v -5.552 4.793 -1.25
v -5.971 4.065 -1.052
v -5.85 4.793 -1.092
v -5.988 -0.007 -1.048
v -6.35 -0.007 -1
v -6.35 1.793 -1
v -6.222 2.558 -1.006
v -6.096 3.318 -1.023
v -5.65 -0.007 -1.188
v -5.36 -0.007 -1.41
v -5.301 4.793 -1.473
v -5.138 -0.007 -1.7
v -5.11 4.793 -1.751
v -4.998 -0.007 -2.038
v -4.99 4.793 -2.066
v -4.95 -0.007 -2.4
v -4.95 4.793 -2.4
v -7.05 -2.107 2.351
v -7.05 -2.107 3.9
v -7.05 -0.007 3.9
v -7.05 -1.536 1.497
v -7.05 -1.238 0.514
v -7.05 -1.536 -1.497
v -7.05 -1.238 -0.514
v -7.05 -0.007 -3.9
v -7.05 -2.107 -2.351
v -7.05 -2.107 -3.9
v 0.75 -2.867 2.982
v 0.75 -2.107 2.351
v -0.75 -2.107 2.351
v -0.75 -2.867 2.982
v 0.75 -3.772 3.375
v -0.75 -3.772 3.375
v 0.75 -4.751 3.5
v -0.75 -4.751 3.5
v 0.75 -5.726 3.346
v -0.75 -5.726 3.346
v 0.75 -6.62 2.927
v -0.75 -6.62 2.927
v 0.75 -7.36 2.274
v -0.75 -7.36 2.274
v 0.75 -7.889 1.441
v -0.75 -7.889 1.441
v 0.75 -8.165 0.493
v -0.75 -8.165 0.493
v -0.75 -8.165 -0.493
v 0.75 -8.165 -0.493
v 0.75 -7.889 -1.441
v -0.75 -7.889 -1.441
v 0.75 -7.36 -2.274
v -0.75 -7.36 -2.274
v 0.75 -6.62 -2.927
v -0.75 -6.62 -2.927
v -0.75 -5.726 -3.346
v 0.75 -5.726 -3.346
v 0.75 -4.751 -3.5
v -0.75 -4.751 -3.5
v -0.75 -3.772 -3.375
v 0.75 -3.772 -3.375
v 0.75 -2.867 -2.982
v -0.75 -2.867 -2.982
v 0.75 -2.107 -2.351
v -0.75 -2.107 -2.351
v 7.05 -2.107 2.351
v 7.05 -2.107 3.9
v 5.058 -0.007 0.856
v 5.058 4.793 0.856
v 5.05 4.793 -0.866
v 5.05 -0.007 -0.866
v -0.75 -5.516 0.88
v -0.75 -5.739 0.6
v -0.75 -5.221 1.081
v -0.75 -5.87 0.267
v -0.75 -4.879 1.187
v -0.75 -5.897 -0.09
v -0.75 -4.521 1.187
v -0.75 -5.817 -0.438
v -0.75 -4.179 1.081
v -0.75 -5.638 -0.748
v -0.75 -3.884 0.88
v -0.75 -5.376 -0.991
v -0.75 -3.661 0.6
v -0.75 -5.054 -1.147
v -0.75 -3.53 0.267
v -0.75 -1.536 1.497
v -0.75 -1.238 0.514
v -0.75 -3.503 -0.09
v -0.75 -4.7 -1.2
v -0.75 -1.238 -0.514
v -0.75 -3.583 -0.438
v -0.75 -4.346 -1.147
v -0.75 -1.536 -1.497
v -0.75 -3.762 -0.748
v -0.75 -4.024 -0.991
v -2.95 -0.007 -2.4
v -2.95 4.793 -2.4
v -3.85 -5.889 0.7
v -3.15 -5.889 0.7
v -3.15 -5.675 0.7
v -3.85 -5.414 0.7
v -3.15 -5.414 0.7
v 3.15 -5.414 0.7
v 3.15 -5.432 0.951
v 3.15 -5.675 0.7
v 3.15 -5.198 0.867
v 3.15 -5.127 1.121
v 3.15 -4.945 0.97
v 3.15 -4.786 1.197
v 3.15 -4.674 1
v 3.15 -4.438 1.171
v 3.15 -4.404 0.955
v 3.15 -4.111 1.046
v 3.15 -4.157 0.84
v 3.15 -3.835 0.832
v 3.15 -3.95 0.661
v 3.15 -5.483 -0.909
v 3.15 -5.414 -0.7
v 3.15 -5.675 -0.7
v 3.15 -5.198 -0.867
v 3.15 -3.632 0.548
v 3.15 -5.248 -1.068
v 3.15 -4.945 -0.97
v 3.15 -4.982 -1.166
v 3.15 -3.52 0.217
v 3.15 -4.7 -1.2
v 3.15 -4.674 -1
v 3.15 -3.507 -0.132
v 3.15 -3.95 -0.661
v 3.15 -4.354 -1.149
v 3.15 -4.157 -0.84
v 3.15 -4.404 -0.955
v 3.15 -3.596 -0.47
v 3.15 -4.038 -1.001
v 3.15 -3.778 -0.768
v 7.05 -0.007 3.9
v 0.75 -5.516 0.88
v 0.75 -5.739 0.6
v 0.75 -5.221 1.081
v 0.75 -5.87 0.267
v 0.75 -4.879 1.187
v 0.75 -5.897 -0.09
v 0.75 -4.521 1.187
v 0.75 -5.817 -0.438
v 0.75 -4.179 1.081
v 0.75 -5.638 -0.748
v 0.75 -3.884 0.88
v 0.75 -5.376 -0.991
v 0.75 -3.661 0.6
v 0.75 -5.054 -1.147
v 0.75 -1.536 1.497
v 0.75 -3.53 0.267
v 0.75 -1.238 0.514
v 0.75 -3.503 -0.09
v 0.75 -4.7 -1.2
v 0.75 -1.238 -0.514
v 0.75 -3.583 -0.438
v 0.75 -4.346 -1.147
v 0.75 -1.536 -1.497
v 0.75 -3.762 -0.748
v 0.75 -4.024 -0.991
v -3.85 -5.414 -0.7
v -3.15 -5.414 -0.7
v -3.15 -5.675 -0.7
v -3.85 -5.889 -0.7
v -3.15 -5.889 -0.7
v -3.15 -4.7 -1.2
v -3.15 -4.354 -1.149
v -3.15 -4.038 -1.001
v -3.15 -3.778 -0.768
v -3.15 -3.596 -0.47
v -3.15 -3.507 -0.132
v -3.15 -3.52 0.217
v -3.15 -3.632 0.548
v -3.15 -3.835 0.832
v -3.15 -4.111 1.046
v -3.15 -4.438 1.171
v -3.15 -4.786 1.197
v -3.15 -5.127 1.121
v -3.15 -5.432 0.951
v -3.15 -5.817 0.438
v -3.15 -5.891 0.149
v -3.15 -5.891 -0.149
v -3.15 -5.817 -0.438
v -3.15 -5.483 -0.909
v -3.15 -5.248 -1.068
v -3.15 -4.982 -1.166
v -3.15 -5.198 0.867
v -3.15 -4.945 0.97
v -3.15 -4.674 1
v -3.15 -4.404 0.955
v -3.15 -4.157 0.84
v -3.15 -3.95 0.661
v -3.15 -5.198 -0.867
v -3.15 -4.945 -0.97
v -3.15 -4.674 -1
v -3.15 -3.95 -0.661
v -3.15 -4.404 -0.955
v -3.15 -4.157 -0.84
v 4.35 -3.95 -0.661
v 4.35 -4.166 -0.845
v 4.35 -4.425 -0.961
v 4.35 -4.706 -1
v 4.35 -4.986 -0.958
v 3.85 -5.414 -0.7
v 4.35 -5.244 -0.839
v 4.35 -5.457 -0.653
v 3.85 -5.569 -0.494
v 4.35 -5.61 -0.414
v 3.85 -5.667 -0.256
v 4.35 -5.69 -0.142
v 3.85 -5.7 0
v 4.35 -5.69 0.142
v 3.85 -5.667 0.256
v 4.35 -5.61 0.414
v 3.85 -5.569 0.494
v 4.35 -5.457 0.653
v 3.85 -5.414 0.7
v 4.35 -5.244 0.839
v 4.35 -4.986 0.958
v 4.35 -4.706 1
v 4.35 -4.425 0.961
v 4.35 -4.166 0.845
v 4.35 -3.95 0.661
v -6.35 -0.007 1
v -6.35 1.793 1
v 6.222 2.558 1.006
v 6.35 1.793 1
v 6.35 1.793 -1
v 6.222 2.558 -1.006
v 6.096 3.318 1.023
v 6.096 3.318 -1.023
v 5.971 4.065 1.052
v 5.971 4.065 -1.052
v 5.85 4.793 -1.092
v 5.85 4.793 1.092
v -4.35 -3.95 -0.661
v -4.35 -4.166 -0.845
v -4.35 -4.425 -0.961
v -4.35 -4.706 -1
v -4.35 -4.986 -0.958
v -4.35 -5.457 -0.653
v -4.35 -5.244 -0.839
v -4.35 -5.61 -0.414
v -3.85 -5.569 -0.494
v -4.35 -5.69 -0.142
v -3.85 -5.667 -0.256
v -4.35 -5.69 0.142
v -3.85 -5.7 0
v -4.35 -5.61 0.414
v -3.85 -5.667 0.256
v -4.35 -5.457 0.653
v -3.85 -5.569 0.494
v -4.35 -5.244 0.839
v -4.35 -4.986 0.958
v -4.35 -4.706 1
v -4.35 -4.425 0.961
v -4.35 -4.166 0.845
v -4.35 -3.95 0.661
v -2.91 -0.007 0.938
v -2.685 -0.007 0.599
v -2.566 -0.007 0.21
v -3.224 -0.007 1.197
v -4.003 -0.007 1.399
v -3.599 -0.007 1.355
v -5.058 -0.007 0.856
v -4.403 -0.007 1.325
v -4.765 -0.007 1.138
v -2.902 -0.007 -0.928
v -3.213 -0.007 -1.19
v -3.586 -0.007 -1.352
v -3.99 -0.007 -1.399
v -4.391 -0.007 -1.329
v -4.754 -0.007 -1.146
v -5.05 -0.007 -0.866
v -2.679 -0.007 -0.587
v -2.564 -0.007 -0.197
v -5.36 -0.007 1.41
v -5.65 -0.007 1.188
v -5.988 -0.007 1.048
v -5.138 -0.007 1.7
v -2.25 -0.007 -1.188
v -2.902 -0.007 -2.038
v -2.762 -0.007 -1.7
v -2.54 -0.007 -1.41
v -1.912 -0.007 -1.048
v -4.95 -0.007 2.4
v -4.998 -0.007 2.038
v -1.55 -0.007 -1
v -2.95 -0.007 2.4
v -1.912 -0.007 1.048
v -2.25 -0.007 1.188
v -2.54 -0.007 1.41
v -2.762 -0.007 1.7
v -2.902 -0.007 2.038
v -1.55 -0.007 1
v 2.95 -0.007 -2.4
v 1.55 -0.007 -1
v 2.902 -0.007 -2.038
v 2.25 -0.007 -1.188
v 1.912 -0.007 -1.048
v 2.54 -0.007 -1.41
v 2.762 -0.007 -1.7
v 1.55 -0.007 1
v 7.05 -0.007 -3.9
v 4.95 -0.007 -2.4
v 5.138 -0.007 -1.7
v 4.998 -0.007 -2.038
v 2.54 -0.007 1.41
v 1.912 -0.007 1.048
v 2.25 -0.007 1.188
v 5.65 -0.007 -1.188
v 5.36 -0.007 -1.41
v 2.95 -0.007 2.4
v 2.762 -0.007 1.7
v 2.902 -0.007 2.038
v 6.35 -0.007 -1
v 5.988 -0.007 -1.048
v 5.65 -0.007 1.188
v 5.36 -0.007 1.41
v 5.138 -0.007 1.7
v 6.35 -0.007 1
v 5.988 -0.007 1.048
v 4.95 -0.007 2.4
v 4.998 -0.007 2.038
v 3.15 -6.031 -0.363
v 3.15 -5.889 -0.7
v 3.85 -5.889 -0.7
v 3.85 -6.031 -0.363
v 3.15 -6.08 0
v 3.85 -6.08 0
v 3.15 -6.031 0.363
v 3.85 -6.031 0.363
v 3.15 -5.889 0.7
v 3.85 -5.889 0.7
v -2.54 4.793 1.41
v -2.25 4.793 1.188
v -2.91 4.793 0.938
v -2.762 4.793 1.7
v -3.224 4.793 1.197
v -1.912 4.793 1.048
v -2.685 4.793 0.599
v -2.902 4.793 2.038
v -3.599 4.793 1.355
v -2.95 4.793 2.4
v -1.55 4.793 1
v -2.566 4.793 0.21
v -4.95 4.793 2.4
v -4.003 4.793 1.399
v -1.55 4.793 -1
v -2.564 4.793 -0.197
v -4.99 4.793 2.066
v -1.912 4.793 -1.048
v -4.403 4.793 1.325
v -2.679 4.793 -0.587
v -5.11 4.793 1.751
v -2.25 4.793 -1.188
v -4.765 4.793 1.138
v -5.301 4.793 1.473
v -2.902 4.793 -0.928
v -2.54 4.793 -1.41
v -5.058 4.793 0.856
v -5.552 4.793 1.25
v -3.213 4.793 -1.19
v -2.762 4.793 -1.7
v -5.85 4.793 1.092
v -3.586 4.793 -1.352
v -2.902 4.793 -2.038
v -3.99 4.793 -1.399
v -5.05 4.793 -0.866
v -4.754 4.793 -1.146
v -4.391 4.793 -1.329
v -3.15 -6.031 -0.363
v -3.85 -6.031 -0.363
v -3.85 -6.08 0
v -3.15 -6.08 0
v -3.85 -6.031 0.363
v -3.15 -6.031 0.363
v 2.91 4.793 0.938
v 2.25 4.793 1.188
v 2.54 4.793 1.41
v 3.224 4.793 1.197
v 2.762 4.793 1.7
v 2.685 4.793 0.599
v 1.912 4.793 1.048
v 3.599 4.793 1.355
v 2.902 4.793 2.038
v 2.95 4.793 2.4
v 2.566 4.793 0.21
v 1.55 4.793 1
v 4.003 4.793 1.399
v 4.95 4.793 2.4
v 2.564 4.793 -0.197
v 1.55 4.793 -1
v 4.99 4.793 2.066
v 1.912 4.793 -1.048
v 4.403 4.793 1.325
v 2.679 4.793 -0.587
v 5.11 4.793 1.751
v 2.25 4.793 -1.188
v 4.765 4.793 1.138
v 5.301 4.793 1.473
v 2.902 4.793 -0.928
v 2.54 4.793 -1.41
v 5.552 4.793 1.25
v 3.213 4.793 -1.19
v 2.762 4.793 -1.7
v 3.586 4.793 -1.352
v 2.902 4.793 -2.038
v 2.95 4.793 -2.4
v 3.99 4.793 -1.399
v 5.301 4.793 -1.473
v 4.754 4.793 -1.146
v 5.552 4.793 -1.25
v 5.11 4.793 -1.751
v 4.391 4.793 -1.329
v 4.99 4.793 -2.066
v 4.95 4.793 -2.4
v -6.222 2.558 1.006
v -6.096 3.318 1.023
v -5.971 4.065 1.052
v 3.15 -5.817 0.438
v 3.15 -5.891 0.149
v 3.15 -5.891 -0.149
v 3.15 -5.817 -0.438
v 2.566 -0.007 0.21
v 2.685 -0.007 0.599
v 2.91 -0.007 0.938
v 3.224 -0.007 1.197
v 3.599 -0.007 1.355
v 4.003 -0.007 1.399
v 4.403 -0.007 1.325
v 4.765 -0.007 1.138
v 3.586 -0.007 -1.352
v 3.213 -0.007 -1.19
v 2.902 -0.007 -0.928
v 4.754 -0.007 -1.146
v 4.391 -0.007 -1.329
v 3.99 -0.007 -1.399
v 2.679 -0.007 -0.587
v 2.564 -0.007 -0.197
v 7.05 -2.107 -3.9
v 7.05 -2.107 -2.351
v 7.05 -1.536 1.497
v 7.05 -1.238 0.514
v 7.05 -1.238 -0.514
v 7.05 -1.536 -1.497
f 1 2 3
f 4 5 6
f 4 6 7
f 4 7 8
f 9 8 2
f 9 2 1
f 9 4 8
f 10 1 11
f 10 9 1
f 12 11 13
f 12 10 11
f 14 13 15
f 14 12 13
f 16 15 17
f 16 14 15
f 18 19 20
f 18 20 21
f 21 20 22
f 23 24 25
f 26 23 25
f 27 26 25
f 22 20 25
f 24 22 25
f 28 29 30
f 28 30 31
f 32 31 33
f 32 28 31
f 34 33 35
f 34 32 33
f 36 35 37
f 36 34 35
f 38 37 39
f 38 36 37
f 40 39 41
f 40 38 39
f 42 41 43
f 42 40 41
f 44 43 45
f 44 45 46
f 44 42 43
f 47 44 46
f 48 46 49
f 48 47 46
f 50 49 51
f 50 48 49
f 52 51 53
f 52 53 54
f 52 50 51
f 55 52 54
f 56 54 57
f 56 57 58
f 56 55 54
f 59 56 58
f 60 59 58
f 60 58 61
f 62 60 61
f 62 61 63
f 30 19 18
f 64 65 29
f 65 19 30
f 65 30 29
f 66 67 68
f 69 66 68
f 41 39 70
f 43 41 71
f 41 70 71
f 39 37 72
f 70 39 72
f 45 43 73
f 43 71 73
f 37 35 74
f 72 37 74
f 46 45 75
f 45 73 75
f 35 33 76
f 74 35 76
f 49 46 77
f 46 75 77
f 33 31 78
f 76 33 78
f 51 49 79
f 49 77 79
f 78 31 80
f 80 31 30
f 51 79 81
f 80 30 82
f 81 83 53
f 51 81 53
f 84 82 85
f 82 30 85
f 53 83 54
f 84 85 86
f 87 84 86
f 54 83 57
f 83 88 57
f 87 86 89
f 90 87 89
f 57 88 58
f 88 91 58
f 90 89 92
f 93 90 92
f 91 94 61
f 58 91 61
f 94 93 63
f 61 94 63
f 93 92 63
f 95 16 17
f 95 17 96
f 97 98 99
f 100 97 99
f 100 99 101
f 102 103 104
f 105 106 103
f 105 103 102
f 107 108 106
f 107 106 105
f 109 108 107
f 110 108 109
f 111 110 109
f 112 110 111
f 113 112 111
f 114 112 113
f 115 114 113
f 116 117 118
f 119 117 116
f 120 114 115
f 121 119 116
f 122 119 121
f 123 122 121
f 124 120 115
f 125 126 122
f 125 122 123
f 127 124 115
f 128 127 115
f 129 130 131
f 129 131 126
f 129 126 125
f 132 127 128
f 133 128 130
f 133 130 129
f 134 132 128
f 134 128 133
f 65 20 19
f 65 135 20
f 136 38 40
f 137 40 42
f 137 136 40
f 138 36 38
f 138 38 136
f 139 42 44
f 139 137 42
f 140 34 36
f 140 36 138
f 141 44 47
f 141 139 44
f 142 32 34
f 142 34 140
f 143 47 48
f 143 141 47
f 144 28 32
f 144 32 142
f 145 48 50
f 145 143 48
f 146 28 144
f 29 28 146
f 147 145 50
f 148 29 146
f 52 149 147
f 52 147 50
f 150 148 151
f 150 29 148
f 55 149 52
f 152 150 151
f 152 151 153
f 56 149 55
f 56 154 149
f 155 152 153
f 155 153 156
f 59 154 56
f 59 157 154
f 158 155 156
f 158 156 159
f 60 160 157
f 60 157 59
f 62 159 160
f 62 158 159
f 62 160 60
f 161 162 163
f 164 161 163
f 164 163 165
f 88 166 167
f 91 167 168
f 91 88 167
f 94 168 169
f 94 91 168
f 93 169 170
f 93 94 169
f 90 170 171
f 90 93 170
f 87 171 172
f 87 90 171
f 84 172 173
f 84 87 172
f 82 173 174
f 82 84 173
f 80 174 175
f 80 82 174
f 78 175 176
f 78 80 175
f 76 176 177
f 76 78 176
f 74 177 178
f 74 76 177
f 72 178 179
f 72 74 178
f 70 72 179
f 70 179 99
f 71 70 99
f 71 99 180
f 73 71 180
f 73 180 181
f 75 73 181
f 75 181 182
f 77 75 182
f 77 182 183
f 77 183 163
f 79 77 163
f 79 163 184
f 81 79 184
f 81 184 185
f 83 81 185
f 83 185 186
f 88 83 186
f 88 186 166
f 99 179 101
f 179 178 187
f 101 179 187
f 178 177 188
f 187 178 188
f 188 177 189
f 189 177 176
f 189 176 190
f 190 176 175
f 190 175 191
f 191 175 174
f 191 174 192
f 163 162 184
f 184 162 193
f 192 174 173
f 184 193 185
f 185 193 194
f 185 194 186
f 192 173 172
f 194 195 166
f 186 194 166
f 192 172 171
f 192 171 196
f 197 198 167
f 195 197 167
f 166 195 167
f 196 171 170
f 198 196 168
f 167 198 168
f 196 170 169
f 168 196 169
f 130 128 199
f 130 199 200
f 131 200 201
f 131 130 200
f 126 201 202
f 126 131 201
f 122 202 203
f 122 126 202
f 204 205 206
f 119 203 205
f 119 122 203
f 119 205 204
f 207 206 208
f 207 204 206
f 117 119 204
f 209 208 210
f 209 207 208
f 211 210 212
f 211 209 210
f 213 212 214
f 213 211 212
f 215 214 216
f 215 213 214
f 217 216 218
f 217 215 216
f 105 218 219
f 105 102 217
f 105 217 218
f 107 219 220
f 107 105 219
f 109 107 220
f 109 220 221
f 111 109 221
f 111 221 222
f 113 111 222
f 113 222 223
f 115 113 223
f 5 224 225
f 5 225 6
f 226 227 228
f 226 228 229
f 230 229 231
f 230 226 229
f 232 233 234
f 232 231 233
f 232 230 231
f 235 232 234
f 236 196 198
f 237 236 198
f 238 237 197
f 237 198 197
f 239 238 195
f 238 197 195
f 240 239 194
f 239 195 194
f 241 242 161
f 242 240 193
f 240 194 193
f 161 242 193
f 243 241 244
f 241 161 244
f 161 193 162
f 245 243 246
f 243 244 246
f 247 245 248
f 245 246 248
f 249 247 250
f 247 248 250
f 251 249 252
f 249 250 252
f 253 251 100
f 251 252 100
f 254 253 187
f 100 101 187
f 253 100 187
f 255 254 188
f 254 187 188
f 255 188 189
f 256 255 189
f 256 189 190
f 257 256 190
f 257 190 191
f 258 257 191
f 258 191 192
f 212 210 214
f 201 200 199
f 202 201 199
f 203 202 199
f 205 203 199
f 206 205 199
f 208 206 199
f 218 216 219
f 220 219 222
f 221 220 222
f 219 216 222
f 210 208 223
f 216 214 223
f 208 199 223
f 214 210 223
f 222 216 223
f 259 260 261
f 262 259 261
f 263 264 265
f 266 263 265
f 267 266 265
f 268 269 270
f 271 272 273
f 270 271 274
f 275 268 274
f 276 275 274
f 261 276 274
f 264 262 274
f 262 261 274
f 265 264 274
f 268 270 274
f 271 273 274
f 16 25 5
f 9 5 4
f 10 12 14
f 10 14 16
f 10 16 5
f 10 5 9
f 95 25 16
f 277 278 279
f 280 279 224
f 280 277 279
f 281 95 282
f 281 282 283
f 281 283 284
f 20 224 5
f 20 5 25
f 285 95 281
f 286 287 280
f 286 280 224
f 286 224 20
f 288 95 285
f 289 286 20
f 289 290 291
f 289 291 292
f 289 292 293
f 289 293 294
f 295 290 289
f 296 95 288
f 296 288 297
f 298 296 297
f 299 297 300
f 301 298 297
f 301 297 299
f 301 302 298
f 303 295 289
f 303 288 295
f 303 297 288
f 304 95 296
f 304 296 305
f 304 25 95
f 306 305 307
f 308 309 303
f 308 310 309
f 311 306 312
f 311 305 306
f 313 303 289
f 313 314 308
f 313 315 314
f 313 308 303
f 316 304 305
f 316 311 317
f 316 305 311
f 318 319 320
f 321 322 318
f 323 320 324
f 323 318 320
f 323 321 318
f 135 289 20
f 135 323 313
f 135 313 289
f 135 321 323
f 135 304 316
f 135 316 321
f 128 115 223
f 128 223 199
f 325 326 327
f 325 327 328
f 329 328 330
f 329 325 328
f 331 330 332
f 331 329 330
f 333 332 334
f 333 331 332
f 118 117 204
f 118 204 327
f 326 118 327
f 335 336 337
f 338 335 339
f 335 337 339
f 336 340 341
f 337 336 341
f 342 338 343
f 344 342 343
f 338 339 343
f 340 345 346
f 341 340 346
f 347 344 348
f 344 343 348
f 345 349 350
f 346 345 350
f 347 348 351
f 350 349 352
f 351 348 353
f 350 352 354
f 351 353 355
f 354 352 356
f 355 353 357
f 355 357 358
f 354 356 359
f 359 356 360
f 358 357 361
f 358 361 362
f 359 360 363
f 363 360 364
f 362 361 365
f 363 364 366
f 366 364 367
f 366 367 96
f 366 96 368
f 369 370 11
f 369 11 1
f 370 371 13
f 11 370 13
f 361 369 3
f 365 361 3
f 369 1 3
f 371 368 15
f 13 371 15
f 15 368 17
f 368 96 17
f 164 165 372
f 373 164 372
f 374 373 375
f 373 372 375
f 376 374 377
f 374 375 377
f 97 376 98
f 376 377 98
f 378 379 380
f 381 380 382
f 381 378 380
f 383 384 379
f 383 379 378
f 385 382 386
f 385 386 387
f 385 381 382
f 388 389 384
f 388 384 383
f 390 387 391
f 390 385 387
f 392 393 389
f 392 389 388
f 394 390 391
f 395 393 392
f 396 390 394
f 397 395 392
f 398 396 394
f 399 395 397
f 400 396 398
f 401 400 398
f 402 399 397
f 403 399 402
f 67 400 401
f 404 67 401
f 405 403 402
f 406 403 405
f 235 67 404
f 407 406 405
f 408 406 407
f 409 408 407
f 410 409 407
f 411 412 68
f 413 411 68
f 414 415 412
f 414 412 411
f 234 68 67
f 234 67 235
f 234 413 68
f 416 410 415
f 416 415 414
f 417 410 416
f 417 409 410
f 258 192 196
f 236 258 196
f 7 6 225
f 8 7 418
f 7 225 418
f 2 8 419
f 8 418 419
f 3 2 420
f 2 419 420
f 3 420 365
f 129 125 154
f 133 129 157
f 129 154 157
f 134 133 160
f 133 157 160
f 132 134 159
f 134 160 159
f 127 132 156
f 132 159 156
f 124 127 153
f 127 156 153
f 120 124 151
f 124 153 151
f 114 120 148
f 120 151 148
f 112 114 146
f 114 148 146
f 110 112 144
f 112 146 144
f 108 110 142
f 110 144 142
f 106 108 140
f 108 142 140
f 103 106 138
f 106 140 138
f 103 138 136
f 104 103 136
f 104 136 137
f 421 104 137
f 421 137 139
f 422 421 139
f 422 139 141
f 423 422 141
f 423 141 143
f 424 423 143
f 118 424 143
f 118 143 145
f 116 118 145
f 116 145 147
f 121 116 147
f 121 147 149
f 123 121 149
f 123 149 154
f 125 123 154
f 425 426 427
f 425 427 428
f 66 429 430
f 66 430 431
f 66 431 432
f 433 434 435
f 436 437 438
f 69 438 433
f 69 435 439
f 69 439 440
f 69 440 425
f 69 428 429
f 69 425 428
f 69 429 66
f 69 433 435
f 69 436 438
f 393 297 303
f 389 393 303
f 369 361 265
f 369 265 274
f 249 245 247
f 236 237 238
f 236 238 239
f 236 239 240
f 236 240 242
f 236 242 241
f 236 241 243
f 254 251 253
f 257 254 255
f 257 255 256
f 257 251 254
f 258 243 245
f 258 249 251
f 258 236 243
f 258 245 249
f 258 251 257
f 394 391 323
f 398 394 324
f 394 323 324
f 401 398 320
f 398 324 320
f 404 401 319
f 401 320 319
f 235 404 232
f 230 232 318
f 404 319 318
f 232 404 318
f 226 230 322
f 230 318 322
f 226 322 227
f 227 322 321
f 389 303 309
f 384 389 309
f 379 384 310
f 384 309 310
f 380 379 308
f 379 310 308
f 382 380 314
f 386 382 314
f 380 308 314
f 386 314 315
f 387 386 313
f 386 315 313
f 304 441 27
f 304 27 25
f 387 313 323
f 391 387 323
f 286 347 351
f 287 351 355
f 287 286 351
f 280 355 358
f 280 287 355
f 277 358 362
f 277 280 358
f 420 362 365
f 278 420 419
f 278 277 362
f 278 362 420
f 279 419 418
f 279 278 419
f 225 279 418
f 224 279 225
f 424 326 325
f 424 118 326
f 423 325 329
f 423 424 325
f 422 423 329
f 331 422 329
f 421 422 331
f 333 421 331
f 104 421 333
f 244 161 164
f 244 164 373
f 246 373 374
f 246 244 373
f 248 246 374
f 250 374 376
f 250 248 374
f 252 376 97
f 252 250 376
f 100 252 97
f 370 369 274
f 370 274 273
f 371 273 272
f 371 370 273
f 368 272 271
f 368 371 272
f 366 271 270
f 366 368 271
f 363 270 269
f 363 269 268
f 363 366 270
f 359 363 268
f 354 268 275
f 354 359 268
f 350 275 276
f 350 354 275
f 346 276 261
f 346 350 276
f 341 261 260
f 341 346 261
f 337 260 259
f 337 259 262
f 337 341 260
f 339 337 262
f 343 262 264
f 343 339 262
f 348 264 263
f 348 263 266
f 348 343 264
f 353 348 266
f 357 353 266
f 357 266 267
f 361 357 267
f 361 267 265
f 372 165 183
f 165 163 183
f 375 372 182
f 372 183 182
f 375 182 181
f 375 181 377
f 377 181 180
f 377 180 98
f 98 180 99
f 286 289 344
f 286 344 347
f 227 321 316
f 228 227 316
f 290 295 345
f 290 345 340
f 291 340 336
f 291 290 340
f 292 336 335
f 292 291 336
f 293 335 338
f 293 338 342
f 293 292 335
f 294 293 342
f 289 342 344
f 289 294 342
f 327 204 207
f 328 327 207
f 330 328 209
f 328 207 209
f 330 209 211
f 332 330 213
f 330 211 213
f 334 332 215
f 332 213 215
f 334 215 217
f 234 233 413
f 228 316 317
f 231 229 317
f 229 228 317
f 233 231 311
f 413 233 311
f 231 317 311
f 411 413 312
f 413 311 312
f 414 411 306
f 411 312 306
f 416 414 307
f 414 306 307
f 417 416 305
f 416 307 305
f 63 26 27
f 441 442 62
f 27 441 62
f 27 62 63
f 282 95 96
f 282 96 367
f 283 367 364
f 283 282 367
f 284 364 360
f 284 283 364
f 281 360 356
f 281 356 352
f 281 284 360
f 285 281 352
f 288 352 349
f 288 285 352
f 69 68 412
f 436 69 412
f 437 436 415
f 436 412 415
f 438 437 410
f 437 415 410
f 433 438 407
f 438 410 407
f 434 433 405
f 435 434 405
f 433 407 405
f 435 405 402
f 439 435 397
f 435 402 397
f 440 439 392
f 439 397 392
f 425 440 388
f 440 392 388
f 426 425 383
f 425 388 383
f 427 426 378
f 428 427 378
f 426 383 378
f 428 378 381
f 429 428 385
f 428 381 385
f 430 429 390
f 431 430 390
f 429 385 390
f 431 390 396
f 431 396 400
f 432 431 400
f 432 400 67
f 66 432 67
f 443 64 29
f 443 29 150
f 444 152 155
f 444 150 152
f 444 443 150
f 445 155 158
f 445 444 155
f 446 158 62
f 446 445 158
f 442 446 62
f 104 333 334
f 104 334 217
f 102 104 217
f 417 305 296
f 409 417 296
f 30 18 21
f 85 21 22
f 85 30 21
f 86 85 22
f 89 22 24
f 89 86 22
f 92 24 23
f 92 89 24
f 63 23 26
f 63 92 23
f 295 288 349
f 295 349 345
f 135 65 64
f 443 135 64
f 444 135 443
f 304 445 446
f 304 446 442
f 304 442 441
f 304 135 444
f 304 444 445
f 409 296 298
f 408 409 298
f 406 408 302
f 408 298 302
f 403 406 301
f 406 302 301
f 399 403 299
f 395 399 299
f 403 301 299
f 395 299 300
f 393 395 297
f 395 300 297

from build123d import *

# Parameters (mm, degrees)
HIP_BASE_EXTRUDED_BOSS_BASE_DEPTH      = 7.05
SKETCH1_3_R                            = 3.5
LEG_JOINT_EXTRUDED_BOSS_BASE_DEPTH     = 0.75
SKETCH2_R                              = 1.2
LEG_PEG_EXTRUDED_BOSS_BASE_DEPTH       = 2.4
LEG_PEG_INNER_EXTRUDED_BOSS_BASE_DEPTH = 1.2
LEG_LOCK_EXTRUDED_DETAIL_DEPTH         = 0.7
HIP_PEG_EXTRUDED_BOSS_BASE_DEPTH       = 4.8
HIP_CAVITY_EXTRUDED_CUT_DEPTH          = 4.8
HIP_PEG_CHAMFER_DEPTH                  = 12.495760088


with BuildPart() as part:
    # Sketch1 → Hip Base - Extruded Boss/Base (new, symmetric)
    with BuildSketch(Plane(origin=(0, 0, 0), x_dir=(0, 0, -1), z_dir=(1, 0, 0))):
        with BuildLine():
            ThreePointArc((-2.351256126, -2.107396168), (0, -1.2), (2.351256126, -2.107396168))
            Line((2.351256126, -2.107396168), (3.9, -2.107396168))
            Line((3.9, -2.107396168), (3.9, -0.007396168))
            Line((3.9, -0.007396168), (-3.9, -0.007396168))
            Line((-3.9, -0.007396168), (-3.9, -2.107396168))
            Line((-3.9, -2.107396168), (-2.351256126, -2.107396168))
        make_face()
    extrude(amount=HIP_BASE_EXTRUDED_BOSS_BASE_DEPTH, both=True)

    # Sketch1<3> → Leg Joint - Extruded Boss/Base (add, symmetric)
    with BuildSketch(Plane(origin=(0, 0, 0), x_dir=(0, 0, -1), z_dir=(1, 0, 0))):
        with Locations((0, -4.7)):
            Circle(SKETCH1_3_R)
    extrude(amount=LEG_JOINT_EXTRUDED_BOSS_BASE_DEPTH, both=True)

    # Sketch2 → Leg Peg - Extruded Boss/Base (add)
    with BuildSketch(Plane(origin=(0.75, 0, 0), x_dir=(0, 0, -1), z_dir=(1, 0, 0))):
        with Locations((0, -4.7)):
            Circle(SKETCH2_R)
    leg_peg_extruded_boss_base = extrude(amount=LEG_PEG_EXTRUDED_BOSS_BASE_DEPTH)

    # Sketch3 → Leg Peg Inner - Extruded Boss/Base (add)
    with BuildSketch(Plane(origin=(3.15, 0, 0), x_dir=(0, 0, -1), z_dir=(1, 0, 0))):
        with BuildLine():
            Line((-0.661437828, -3.95), (0.661437828, -3.95))
            ThreePointArc((0.661437828, -3.95), (0, -5.7), (-0.661437828, -3.95))
        make_face()
    leg_peg_inner_extruded_boss_base = extrude(amount=LEG_PEG_INNER_EXTRUDED_BOSS_BASE_DEPTH)

    # Sketch4 → Leg Lock - Extruded Detail (add)
    with BuildSketch(Plane(origin=(3.15, 0, 0), x_dir=(0, 0, -1), z_dir=(1, 0, 0))):
        with BuildLine():
            Line((-0.7, -5.8892855), (-0.7, -5.414142843))
            ThreePointArc((-0.7, -5.414142843), (0, -5.7), (0.7, -5.414142843))
            Line((0.7, -5.414142843), (0.7, -5.8892855))
            ThreePointArc((0.7, -5.8892855), (0, -6.08), (-0.7, -5.8892855))
        make_face()
    leg_lock_extruded_detail = extrude(amount=LEG_LOCK_EXTRUDED_DETAIL_DEPTH)

    # Sketch5 → Hip Peg - Extruded Boss/Base (add)
    with BuildSketch(Plane(origin=(0, -0.007396168, 0), x_dir=(1, 0, 0), z_dir=(0, 1, 0))):
        with BuildLine():
            ThreePointArc((1.55, -1), (2.539949494, -1.410050506), (2.95, -2.4))
            Line((2.95, -2.4), (4.95, -2.4))
            ThreePointArc((4.95, -2.4), (5.360050506, -1.410050506), (6.35, -1))
            Line((6.35, -1), (6.35, 1))
            ThreePointArc((6.35, 1), (5.360050506, 1.410050506), (4.95, 2.4))
            Line((4.95, 2.4), (2.95, 2.4))
            ThreePointArc((2.95, 2.4), (2.539949494, 1.410050506), (1.55, 1))
            Line((1.55, 1), (1.55, -1))
        make_face()
    hip_peg_extruded_boss_base = extrude(amount=HIP_PEG_EXTRUDED_BOSS_BASE_DEPTH)

    # Sketch6 → Hip Cavity - Extruded Cut (cut)
    with BuildSketch(Plane(origin=(0, 4.792603832, 0), x_dir=(1, 0, 0), z_dir=(0, 1, 0))):
        with BuildLine():
            Line((5.058021727, -0.855738191), (5.05, 0.866025404))
            ThreePointArc((5.05, 0.866025404), (2.550015194, -0.006522554), (5.058021727, -0.855738191))
        make_face()
    hip_cavity_extruded_cut = extrude(amount=-HIP_CAVITY_EXTRUDED_CUT_DEPTH, mode=Mode.SUBTRACT)

    # Sketch7 → Hip Peg Chamfer (cut, symmetric)
    with BuildSketch(Plane.XY):
        Polygon((6.35, 4.792603832), (6.35, 1.792603832), (5.85, 4.792603832), align=None)
    hip_peg_chamfer = extrude(amount=HIP_PEG_CHAMFER_DEPTH, both=True, mode=Mode.SUBTRACT)

    # Mirror1: Leg Peg - Extruded Boss/Base, Leg Peg Inner - Extruded Boss/Base, Leg Lock - Extruded Detail, Hip Peg - Extruded Boss/Base, Hip Cavity - Extruded Cut, Hip Peg Chamfer across plane
    add(leg_peg_extruded_boss_base.mirror(Plane(origin=(0, 0, 0), x_dir=(0, 0, 1), z_dir=(1, 0, 0))))
    add(leg_peg_inner_extruded_boss_base.mirror(Plane(origin=(0, 0, 0), x_dir=(0, 0, 1), z_dir=(1, 0, 0))))
    add(leg_lock_extruded_detail.mirror(Plane(origin=(0, 0, 0), x_dir=(0, 0, 1), z_dir=(1, 0, 0))))
    add(hip_peg_extruded_boss_base.mirror(Plane(origin=(0, 0, 0), x_dir=(0, 0, 1), z_dir=(1, 0, 0))))
    add(hip_cavity_extruded_cut.mirror(Plane(origin=(0, 0, 0), x_dir=(0, 0, 1), z_dir=(1, 0, 0))), mode=Mode.SUBTRACT)
    add(hip_peg_chamfer.mirror(Plane(origin=(0, 0, 0), x_dir=(0, 0, 1), z_dir=(1, 0, 0))), mode=Mode.SUBTRACT)


solid = part.part
